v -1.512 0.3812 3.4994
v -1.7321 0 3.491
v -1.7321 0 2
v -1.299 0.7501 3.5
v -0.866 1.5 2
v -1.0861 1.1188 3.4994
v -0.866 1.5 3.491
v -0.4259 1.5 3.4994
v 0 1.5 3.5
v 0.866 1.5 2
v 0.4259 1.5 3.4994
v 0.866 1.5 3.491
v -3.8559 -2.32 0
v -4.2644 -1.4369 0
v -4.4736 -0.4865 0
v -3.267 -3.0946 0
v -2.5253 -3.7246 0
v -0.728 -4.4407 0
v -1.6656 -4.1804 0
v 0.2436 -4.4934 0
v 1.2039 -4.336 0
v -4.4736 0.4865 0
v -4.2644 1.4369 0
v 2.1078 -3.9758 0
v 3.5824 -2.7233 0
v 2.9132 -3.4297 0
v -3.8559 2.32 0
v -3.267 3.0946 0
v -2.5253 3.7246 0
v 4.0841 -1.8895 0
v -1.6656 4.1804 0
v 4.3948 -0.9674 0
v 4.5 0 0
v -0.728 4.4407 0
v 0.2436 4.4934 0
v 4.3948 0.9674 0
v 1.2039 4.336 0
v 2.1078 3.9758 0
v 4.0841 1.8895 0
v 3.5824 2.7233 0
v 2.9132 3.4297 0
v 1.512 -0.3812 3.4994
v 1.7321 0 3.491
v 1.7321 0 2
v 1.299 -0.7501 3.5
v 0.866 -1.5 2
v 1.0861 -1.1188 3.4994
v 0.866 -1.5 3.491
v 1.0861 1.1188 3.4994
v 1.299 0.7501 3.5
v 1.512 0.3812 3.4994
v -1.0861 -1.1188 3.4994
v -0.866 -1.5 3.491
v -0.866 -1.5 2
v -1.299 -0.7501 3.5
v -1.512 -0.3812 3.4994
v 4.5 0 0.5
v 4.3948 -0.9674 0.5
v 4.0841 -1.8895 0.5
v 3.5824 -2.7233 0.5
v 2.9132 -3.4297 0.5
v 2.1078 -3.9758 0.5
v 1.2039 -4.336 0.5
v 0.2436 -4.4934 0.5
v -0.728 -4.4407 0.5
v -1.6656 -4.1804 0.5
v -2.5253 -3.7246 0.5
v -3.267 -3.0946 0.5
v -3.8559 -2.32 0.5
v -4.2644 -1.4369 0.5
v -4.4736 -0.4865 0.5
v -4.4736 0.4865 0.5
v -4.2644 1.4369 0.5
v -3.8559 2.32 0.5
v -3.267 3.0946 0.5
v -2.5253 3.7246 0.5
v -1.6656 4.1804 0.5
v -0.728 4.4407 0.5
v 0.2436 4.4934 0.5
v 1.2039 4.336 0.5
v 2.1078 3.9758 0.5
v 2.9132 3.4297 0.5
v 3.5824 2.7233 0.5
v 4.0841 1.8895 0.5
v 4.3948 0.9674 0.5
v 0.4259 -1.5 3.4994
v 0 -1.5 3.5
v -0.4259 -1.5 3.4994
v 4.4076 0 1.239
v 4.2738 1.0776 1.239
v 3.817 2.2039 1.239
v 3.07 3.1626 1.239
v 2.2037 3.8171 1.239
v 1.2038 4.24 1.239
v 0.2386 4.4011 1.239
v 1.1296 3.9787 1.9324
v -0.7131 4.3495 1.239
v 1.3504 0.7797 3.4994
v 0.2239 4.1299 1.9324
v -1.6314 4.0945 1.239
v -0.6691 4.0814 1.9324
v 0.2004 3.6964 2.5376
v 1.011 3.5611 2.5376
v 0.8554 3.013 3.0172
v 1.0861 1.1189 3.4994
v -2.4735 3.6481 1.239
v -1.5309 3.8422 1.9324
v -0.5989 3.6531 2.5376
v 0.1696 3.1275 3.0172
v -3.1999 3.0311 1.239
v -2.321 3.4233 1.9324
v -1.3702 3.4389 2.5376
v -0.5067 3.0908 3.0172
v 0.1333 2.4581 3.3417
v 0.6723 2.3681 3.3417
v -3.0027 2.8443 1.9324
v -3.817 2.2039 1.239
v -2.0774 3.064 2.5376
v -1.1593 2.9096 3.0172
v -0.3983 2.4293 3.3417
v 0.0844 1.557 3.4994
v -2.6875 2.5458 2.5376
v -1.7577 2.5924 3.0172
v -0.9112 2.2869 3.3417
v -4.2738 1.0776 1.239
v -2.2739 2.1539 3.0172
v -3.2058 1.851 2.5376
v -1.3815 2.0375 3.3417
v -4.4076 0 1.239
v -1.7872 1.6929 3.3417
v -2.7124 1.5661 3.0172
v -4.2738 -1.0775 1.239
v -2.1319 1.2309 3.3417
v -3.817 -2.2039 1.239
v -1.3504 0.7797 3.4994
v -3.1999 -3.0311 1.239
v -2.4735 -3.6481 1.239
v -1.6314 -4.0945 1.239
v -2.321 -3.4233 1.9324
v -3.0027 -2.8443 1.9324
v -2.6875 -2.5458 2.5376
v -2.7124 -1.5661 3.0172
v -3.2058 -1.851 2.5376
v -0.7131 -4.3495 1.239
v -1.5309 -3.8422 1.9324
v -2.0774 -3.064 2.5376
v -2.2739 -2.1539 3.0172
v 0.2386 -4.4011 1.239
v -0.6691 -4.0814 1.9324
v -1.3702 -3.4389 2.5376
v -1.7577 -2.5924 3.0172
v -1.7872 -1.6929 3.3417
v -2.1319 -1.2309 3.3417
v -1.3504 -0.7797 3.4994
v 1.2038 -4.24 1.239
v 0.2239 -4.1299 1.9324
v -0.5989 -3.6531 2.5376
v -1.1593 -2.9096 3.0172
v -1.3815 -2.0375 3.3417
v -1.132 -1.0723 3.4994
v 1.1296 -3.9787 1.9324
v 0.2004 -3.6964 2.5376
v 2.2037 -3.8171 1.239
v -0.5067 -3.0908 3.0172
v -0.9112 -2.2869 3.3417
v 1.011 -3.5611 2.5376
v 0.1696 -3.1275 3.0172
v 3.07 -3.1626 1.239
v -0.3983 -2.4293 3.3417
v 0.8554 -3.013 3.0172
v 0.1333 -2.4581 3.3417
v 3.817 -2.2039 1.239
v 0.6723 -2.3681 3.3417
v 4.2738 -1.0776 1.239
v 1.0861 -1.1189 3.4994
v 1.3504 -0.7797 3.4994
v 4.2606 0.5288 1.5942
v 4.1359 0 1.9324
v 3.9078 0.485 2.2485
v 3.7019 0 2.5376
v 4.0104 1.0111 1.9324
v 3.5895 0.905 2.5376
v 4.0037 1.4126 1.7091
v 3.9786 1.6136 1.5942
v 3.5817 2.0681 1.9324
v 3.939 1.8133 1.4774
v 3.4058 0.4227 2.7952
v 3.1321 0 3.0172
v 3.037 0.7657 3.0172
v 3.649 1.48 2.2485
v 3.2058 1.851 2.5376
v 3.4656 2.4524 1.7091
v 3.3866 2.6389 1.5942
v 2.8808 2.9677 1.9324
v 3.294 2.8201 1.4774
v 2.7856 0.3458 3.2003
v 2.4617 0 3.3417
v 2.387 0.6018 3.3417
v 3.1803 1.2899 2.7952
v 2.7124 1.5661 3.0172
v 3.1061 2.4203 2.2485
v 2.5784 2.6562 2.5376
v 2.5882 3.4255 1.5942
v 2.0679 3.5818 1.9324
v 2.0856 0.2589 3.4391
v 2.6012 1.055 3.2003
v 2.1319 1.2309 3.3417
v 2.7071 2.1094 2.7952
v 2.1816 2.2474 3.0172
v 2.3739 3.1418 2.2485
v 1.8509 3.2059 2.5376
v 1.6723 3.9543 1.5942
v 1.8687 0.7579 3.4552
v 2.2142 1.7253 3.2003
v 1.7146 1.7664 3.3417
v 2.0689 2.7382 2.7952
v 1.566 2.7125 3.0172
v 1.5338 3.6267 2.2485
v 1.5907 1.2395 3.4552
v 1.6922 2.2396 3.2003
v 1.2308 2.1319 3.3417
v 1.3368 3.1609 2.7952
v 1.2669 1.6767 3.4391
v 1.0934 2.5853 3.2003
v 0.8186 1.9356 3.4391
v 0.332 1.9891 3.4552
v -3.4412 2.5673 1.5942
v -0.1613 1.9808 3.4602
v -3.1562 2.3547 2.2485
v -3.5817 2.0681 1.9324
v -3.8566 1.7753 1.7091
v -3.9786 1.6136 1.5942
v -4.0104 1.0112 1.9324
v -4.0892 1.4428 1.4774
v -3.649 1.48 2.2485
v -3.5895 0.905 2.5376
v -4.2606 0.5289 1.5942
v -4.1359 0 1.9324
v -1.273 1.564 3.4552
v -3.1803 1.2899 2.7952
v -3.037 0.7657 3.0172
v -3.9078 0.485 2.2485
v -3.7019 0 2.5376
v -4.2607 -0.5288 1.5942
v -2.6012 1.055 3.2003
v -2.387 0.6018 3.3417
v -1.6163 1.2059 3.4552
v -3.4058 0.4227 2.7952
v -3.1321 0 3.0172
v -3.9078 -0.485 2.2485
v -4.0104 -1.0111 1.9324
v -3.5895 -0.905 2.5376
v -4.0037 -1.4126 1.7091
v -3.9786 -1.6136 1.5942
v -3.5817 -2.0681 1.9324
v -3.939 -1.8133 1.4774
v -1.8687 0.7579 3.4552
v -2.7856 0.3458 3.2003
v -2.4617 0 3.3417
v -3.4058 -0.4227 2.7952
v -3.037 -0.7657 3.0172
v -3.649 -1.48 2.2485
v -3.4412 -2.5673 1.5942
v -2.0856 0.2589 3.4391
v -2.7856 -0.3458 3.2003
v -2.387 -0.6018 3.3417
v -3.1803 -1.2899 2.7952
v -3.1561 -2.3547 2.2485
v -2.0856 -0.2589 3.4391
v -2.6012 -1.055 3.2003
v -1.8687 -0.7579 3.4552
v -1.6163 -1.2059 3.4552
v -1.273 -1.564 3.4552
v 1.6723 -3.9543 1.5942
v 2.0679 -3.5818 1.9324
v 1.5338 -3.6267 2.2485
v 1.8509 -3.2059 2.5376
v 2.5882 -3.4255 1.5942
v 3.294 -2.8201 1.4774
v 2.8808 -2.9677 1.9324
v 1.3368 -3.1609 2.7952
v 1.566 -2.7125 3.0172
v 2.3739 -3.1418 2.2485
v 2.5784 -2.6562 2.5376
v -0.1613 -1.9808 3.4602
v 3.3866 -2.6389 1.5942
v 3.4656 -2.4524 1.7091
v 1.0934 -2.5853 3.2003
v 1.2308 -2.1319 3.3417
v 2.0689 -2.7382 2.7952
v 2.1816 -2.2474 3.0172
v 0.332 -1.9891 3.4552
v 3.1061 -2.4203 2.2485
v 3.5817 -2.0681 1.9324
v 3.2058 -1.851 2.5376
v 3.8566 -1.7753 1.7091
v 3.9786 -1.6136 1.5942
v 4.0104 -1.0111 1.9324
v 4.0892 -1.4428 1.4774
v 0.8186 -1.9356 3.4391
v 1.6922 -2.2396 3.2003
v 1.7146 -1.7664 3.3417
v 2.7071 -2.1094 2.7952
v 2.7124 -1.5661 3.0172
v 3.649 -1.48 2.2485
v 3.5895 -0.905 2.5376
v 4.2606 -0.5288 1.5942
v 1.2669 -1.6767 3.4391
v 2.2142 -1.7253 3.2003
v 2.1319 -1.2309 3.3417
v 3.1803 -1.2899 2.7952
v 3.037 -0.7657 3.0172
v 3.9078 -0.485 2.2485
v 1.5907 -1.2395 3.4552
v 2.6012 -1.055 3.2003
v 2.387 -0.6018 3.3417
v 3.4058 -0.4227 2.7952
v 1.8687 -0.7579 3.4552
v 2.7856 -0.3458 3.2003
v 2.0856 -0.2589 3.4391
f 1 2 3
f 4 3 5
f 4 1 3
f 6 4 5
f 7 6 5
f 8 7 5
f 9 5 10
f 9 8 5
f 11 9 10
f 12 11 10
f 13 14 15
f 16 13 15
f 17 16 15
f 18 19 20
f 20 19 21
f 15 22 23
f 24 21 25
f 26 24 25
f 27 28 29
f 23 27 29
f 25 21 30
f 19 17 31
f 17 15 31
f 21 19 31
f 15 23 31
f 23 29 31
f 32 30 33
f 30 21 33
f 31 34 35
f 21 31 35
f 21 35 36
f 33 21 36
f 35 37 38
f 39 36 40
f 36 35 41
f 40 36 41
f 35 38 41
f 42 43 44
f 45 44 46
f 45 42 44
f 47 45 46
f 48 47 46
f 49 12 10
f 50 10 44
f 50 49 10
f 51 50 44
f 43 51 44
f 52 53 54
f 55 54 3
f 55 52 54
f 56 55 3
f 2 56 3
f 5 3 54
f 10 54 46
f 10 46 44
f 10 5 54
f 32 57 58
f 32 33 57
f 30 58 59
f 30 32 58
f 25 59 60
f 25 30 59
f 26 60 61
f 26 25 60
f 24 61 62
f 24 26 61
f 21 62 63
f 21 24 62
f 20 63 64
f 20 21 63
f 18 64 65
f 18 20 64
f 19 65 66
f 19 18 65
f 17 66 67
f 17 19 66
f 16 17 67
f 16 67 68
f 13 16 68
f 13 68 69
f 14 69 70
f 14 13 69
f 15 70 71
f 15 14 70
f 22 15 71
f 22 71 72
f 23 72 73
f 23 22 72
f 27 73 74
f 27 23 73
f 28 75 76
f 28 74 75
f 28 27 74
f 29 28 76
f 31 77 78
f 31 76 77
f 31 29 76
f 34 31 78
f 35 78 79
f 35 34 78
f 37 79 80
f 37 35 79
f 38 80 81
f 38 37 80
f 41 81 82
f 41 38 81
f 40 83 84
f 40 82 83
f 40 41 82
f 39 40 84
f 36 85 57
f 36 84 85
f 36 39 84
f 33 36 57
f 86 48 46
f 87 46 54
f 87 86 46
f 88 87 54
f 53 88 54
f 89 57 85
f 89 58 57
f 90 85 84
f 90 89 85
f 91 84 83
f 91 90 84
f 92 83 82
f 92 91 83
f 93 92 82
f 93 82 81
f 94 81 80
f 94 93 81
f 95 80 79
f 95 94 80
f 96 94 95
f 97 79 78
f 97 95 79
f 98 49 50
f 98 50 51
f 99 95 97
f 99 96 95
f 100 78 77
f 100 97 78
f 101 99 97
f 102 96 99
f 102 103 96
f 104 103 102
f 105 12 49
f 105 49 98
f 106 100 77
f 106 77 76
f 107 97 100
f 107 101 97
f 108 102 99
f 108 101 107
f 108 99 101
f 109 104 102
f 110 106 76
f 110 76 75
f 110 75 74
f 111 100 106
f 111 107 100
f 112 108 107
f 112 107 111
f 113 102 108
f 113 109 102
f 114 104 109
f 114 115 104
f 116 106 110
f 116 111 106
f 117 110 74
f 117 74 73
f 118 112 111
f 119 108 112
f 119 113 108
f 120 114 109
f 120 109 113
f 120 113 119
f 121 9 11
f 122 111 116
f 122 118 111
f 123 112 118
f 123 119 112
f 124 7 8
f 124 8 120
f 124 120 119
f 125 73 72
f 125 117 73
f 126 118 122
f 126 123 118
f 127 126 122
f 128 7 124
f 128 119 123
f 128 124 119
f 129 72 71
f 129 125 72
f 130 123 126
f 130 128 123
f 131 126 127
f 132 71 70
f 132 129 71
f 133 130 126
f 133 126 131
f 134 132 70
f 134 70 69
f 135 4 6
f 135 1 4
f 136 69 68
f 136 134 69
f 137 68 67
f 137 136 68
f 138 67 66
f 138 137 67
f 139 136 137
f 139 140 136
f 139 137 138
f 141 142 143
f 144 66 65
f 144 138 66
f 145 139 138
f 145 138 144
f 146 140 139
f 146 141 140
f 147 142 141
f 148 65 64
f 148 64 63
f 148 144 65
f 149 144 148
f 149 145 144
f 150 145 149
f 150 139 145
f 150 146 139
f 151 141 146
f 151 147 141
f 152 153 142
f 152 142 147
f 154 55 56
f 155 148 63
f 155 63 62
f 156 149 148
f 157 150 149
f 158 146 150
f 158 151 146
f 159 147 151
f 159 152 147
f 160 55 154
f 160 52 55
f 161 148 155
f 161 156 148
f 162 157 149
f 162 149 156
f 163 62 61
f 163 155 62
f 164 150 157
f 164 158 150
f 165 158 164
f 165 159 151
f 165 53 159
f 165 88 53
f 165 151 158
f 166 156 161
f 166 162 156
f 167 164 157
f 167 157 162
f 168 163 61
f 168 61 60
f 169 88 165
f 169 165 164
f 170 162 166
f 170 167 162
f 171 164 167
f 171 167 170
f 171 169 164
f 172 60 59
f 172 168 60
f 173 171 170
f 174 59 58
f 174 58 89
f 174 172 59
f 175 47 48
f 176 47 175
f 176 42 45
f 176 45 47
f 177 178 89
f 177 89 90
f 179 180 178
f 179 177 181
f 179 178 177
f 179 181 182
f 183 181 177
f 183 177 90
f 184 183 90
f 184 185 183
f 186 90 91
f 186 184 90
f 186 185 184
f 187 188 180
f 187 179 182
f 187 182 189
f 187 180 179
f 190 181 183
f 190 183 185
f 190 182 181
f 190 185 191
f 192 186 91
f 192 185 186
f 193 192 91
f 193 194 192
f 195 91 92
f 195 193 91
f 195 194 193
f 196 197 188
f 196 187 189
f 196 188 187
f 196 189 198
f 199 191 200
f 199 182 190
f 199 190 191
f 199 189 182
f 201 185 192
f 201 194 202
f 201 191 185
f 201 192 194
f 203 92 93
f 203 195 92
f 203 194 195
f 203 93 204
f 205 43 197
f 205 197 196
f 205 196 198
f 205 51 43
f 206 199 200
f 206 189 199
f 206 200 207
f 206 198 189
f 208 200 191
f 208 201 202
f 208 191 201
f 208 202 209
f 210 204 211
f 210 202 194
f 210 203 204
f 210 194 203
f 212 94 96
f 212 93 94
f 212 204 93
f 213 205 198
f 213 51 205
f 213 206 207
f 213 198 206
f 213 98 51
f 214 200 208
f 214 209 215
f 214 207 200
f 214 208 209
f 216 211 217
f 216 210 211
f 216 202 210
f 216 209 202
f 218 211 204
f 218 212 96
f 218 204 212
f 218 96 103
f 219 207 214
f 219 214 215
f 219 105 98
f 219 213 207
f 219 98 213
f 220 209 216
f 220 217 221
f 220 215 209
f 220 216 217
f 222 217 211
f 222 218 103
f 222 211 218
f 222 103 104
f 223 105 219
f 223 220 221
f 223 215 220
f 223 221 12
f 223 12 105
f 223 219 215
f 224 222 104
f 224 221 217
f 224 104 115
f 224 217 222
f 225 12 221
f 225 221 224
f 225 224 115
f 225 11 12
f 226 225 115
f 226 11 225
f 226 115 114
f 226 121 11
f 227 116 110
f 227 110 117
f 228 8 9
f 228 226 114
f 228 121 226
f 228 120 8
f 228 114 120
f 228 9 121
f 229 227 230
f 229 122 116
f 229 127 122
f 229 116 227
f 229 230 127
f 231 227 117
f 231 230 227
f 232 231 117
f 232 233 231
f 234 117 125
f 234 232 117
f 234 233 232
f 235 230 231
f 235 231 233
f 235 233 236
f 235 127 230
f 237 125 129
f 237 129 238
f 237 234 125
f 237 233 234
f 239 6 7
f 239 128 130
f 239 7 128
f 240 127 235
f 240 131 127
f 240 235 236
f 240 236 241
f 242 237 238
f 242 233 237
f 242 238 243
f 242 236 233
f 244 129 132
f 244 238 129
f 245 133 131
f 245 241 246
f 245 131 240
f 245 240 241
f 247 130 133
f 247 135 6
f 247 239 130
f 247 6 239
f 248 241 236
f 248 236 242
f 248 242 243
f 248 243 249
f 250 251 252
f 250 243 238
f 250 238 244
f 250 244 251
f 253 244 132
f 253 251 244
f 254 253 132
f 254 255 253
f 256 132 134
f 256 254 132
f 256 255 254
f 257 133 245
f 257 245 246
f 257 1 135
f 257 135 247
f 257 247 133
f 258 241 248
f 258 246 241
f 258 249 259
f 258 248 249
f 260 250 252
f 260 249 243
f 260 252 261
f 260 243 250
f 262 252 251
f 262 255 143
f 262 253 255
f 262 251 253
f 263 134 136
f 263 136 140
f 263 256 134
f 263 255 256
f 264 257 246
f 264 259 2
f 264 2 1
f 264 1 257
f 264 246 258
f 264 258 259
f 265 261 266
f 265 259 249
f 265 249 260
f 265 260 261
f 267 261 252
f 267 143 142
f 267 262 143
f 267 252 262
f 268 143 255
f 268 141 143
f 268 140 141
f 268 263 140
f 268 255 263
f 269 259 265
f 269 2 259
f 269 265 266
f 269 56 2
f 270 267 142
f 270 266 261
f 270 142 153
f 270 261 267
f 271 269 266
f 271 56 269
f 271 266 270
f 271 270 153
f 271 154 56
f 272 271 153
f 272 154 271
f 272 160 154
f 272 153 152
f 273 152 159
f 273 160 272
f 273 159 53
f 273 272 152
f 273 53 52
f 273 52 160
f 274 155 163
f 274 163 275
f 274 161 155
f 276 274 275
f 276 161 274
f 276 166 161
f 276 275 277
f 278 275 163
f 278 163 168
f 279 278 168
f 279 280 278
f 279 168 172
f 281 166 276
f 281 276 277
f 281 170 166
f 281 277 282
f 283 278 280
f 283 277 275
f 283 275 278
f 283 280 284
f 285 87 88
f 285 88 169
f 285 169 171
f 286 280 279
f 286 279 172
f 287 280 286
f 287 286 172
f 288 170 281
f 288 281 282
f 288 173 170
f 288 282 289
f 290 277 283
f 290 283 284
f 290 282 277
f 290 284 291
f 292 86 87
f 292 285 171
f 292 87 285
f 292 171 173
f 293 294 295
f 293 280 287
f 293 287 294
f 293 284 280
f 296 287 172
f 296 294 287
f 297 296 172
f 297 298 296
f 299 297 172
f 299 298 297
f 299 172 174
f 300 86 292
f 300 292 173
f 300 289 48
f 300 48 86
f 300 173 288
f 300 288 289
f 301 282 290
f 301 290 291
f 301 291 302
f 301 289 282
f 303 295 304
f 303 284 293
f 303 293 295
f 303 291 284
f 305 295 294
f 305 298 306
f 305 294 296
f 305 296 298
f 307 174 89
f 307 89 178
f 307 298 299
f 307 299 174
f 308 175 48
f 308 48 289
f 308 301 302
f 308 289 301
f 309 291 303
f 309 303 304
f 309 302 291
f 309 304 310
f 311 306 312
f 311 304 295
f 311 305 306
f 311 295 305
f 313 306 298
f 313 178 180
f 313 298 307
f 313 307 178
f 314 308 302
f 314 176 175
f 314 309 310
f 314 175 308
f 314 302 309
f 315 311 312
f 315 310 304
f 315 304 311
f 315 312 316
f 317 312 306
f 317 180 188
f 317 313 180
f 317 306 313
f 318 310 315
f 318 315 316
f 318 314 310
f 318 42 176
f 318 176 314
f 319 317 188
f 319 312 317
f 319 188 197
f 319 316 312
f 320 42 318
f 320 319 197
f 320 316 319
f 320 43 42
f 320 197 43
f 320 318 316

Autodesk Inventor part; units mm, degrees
ref_plane "YZ Plane" through (0, 0, 0) normal (1, 0, 0) x (0, 1, 0)
ref_plane "XZ Plane" through (0, 0, 0) normal (0, 1, 0) x (-1, 0, 0)
ref_plane "XY Plane" through (0, 0, 0) normal (0, 0, 1) x (1, 0, 0)
sketch "Sketch1" plane through (0, 0, 0) normal (0, 0, 1) x (1, 0, 0)
  circle A0 centre (0, 0) radius 4.5
  dimension "d0" = 9
extrude "Extrusion1" add sketch "Sketch1" along normal blind 3.5
fillet "Fillet1" radius 3 1 edges at (-4.5, 0, 3.5)
sketch "Sketch2" plane through (0, 0, 3.5) normal (0, 0, 1) x (1, 0, 0)
  line L0 (1.7321, 0) -> (0.866, -1.5)
  line L1 (0.866, -1.5) -> (-0.866, -1.5)
  line L2 (-0.866, -1.5) -> (-1.7321, 0)
  line L3 (-1.7321, 0) -> (-0.866, 1.5)
  line L4 (-0.866, 1.5) -> (0.866, 1.5)
  line L5 (0.866, 1.5) -> (1.7321, 0)
  point P0 (0, 0)
  point P1 (0, 0)
  dimension "d4" = 3
extrude "Extrusion2" cut sketch "Sketch2" against normal blind 1.5
properties part number "ENDER 3 E_PLATE_SCREW" material "Steel, High Strength, Low Alloy"
